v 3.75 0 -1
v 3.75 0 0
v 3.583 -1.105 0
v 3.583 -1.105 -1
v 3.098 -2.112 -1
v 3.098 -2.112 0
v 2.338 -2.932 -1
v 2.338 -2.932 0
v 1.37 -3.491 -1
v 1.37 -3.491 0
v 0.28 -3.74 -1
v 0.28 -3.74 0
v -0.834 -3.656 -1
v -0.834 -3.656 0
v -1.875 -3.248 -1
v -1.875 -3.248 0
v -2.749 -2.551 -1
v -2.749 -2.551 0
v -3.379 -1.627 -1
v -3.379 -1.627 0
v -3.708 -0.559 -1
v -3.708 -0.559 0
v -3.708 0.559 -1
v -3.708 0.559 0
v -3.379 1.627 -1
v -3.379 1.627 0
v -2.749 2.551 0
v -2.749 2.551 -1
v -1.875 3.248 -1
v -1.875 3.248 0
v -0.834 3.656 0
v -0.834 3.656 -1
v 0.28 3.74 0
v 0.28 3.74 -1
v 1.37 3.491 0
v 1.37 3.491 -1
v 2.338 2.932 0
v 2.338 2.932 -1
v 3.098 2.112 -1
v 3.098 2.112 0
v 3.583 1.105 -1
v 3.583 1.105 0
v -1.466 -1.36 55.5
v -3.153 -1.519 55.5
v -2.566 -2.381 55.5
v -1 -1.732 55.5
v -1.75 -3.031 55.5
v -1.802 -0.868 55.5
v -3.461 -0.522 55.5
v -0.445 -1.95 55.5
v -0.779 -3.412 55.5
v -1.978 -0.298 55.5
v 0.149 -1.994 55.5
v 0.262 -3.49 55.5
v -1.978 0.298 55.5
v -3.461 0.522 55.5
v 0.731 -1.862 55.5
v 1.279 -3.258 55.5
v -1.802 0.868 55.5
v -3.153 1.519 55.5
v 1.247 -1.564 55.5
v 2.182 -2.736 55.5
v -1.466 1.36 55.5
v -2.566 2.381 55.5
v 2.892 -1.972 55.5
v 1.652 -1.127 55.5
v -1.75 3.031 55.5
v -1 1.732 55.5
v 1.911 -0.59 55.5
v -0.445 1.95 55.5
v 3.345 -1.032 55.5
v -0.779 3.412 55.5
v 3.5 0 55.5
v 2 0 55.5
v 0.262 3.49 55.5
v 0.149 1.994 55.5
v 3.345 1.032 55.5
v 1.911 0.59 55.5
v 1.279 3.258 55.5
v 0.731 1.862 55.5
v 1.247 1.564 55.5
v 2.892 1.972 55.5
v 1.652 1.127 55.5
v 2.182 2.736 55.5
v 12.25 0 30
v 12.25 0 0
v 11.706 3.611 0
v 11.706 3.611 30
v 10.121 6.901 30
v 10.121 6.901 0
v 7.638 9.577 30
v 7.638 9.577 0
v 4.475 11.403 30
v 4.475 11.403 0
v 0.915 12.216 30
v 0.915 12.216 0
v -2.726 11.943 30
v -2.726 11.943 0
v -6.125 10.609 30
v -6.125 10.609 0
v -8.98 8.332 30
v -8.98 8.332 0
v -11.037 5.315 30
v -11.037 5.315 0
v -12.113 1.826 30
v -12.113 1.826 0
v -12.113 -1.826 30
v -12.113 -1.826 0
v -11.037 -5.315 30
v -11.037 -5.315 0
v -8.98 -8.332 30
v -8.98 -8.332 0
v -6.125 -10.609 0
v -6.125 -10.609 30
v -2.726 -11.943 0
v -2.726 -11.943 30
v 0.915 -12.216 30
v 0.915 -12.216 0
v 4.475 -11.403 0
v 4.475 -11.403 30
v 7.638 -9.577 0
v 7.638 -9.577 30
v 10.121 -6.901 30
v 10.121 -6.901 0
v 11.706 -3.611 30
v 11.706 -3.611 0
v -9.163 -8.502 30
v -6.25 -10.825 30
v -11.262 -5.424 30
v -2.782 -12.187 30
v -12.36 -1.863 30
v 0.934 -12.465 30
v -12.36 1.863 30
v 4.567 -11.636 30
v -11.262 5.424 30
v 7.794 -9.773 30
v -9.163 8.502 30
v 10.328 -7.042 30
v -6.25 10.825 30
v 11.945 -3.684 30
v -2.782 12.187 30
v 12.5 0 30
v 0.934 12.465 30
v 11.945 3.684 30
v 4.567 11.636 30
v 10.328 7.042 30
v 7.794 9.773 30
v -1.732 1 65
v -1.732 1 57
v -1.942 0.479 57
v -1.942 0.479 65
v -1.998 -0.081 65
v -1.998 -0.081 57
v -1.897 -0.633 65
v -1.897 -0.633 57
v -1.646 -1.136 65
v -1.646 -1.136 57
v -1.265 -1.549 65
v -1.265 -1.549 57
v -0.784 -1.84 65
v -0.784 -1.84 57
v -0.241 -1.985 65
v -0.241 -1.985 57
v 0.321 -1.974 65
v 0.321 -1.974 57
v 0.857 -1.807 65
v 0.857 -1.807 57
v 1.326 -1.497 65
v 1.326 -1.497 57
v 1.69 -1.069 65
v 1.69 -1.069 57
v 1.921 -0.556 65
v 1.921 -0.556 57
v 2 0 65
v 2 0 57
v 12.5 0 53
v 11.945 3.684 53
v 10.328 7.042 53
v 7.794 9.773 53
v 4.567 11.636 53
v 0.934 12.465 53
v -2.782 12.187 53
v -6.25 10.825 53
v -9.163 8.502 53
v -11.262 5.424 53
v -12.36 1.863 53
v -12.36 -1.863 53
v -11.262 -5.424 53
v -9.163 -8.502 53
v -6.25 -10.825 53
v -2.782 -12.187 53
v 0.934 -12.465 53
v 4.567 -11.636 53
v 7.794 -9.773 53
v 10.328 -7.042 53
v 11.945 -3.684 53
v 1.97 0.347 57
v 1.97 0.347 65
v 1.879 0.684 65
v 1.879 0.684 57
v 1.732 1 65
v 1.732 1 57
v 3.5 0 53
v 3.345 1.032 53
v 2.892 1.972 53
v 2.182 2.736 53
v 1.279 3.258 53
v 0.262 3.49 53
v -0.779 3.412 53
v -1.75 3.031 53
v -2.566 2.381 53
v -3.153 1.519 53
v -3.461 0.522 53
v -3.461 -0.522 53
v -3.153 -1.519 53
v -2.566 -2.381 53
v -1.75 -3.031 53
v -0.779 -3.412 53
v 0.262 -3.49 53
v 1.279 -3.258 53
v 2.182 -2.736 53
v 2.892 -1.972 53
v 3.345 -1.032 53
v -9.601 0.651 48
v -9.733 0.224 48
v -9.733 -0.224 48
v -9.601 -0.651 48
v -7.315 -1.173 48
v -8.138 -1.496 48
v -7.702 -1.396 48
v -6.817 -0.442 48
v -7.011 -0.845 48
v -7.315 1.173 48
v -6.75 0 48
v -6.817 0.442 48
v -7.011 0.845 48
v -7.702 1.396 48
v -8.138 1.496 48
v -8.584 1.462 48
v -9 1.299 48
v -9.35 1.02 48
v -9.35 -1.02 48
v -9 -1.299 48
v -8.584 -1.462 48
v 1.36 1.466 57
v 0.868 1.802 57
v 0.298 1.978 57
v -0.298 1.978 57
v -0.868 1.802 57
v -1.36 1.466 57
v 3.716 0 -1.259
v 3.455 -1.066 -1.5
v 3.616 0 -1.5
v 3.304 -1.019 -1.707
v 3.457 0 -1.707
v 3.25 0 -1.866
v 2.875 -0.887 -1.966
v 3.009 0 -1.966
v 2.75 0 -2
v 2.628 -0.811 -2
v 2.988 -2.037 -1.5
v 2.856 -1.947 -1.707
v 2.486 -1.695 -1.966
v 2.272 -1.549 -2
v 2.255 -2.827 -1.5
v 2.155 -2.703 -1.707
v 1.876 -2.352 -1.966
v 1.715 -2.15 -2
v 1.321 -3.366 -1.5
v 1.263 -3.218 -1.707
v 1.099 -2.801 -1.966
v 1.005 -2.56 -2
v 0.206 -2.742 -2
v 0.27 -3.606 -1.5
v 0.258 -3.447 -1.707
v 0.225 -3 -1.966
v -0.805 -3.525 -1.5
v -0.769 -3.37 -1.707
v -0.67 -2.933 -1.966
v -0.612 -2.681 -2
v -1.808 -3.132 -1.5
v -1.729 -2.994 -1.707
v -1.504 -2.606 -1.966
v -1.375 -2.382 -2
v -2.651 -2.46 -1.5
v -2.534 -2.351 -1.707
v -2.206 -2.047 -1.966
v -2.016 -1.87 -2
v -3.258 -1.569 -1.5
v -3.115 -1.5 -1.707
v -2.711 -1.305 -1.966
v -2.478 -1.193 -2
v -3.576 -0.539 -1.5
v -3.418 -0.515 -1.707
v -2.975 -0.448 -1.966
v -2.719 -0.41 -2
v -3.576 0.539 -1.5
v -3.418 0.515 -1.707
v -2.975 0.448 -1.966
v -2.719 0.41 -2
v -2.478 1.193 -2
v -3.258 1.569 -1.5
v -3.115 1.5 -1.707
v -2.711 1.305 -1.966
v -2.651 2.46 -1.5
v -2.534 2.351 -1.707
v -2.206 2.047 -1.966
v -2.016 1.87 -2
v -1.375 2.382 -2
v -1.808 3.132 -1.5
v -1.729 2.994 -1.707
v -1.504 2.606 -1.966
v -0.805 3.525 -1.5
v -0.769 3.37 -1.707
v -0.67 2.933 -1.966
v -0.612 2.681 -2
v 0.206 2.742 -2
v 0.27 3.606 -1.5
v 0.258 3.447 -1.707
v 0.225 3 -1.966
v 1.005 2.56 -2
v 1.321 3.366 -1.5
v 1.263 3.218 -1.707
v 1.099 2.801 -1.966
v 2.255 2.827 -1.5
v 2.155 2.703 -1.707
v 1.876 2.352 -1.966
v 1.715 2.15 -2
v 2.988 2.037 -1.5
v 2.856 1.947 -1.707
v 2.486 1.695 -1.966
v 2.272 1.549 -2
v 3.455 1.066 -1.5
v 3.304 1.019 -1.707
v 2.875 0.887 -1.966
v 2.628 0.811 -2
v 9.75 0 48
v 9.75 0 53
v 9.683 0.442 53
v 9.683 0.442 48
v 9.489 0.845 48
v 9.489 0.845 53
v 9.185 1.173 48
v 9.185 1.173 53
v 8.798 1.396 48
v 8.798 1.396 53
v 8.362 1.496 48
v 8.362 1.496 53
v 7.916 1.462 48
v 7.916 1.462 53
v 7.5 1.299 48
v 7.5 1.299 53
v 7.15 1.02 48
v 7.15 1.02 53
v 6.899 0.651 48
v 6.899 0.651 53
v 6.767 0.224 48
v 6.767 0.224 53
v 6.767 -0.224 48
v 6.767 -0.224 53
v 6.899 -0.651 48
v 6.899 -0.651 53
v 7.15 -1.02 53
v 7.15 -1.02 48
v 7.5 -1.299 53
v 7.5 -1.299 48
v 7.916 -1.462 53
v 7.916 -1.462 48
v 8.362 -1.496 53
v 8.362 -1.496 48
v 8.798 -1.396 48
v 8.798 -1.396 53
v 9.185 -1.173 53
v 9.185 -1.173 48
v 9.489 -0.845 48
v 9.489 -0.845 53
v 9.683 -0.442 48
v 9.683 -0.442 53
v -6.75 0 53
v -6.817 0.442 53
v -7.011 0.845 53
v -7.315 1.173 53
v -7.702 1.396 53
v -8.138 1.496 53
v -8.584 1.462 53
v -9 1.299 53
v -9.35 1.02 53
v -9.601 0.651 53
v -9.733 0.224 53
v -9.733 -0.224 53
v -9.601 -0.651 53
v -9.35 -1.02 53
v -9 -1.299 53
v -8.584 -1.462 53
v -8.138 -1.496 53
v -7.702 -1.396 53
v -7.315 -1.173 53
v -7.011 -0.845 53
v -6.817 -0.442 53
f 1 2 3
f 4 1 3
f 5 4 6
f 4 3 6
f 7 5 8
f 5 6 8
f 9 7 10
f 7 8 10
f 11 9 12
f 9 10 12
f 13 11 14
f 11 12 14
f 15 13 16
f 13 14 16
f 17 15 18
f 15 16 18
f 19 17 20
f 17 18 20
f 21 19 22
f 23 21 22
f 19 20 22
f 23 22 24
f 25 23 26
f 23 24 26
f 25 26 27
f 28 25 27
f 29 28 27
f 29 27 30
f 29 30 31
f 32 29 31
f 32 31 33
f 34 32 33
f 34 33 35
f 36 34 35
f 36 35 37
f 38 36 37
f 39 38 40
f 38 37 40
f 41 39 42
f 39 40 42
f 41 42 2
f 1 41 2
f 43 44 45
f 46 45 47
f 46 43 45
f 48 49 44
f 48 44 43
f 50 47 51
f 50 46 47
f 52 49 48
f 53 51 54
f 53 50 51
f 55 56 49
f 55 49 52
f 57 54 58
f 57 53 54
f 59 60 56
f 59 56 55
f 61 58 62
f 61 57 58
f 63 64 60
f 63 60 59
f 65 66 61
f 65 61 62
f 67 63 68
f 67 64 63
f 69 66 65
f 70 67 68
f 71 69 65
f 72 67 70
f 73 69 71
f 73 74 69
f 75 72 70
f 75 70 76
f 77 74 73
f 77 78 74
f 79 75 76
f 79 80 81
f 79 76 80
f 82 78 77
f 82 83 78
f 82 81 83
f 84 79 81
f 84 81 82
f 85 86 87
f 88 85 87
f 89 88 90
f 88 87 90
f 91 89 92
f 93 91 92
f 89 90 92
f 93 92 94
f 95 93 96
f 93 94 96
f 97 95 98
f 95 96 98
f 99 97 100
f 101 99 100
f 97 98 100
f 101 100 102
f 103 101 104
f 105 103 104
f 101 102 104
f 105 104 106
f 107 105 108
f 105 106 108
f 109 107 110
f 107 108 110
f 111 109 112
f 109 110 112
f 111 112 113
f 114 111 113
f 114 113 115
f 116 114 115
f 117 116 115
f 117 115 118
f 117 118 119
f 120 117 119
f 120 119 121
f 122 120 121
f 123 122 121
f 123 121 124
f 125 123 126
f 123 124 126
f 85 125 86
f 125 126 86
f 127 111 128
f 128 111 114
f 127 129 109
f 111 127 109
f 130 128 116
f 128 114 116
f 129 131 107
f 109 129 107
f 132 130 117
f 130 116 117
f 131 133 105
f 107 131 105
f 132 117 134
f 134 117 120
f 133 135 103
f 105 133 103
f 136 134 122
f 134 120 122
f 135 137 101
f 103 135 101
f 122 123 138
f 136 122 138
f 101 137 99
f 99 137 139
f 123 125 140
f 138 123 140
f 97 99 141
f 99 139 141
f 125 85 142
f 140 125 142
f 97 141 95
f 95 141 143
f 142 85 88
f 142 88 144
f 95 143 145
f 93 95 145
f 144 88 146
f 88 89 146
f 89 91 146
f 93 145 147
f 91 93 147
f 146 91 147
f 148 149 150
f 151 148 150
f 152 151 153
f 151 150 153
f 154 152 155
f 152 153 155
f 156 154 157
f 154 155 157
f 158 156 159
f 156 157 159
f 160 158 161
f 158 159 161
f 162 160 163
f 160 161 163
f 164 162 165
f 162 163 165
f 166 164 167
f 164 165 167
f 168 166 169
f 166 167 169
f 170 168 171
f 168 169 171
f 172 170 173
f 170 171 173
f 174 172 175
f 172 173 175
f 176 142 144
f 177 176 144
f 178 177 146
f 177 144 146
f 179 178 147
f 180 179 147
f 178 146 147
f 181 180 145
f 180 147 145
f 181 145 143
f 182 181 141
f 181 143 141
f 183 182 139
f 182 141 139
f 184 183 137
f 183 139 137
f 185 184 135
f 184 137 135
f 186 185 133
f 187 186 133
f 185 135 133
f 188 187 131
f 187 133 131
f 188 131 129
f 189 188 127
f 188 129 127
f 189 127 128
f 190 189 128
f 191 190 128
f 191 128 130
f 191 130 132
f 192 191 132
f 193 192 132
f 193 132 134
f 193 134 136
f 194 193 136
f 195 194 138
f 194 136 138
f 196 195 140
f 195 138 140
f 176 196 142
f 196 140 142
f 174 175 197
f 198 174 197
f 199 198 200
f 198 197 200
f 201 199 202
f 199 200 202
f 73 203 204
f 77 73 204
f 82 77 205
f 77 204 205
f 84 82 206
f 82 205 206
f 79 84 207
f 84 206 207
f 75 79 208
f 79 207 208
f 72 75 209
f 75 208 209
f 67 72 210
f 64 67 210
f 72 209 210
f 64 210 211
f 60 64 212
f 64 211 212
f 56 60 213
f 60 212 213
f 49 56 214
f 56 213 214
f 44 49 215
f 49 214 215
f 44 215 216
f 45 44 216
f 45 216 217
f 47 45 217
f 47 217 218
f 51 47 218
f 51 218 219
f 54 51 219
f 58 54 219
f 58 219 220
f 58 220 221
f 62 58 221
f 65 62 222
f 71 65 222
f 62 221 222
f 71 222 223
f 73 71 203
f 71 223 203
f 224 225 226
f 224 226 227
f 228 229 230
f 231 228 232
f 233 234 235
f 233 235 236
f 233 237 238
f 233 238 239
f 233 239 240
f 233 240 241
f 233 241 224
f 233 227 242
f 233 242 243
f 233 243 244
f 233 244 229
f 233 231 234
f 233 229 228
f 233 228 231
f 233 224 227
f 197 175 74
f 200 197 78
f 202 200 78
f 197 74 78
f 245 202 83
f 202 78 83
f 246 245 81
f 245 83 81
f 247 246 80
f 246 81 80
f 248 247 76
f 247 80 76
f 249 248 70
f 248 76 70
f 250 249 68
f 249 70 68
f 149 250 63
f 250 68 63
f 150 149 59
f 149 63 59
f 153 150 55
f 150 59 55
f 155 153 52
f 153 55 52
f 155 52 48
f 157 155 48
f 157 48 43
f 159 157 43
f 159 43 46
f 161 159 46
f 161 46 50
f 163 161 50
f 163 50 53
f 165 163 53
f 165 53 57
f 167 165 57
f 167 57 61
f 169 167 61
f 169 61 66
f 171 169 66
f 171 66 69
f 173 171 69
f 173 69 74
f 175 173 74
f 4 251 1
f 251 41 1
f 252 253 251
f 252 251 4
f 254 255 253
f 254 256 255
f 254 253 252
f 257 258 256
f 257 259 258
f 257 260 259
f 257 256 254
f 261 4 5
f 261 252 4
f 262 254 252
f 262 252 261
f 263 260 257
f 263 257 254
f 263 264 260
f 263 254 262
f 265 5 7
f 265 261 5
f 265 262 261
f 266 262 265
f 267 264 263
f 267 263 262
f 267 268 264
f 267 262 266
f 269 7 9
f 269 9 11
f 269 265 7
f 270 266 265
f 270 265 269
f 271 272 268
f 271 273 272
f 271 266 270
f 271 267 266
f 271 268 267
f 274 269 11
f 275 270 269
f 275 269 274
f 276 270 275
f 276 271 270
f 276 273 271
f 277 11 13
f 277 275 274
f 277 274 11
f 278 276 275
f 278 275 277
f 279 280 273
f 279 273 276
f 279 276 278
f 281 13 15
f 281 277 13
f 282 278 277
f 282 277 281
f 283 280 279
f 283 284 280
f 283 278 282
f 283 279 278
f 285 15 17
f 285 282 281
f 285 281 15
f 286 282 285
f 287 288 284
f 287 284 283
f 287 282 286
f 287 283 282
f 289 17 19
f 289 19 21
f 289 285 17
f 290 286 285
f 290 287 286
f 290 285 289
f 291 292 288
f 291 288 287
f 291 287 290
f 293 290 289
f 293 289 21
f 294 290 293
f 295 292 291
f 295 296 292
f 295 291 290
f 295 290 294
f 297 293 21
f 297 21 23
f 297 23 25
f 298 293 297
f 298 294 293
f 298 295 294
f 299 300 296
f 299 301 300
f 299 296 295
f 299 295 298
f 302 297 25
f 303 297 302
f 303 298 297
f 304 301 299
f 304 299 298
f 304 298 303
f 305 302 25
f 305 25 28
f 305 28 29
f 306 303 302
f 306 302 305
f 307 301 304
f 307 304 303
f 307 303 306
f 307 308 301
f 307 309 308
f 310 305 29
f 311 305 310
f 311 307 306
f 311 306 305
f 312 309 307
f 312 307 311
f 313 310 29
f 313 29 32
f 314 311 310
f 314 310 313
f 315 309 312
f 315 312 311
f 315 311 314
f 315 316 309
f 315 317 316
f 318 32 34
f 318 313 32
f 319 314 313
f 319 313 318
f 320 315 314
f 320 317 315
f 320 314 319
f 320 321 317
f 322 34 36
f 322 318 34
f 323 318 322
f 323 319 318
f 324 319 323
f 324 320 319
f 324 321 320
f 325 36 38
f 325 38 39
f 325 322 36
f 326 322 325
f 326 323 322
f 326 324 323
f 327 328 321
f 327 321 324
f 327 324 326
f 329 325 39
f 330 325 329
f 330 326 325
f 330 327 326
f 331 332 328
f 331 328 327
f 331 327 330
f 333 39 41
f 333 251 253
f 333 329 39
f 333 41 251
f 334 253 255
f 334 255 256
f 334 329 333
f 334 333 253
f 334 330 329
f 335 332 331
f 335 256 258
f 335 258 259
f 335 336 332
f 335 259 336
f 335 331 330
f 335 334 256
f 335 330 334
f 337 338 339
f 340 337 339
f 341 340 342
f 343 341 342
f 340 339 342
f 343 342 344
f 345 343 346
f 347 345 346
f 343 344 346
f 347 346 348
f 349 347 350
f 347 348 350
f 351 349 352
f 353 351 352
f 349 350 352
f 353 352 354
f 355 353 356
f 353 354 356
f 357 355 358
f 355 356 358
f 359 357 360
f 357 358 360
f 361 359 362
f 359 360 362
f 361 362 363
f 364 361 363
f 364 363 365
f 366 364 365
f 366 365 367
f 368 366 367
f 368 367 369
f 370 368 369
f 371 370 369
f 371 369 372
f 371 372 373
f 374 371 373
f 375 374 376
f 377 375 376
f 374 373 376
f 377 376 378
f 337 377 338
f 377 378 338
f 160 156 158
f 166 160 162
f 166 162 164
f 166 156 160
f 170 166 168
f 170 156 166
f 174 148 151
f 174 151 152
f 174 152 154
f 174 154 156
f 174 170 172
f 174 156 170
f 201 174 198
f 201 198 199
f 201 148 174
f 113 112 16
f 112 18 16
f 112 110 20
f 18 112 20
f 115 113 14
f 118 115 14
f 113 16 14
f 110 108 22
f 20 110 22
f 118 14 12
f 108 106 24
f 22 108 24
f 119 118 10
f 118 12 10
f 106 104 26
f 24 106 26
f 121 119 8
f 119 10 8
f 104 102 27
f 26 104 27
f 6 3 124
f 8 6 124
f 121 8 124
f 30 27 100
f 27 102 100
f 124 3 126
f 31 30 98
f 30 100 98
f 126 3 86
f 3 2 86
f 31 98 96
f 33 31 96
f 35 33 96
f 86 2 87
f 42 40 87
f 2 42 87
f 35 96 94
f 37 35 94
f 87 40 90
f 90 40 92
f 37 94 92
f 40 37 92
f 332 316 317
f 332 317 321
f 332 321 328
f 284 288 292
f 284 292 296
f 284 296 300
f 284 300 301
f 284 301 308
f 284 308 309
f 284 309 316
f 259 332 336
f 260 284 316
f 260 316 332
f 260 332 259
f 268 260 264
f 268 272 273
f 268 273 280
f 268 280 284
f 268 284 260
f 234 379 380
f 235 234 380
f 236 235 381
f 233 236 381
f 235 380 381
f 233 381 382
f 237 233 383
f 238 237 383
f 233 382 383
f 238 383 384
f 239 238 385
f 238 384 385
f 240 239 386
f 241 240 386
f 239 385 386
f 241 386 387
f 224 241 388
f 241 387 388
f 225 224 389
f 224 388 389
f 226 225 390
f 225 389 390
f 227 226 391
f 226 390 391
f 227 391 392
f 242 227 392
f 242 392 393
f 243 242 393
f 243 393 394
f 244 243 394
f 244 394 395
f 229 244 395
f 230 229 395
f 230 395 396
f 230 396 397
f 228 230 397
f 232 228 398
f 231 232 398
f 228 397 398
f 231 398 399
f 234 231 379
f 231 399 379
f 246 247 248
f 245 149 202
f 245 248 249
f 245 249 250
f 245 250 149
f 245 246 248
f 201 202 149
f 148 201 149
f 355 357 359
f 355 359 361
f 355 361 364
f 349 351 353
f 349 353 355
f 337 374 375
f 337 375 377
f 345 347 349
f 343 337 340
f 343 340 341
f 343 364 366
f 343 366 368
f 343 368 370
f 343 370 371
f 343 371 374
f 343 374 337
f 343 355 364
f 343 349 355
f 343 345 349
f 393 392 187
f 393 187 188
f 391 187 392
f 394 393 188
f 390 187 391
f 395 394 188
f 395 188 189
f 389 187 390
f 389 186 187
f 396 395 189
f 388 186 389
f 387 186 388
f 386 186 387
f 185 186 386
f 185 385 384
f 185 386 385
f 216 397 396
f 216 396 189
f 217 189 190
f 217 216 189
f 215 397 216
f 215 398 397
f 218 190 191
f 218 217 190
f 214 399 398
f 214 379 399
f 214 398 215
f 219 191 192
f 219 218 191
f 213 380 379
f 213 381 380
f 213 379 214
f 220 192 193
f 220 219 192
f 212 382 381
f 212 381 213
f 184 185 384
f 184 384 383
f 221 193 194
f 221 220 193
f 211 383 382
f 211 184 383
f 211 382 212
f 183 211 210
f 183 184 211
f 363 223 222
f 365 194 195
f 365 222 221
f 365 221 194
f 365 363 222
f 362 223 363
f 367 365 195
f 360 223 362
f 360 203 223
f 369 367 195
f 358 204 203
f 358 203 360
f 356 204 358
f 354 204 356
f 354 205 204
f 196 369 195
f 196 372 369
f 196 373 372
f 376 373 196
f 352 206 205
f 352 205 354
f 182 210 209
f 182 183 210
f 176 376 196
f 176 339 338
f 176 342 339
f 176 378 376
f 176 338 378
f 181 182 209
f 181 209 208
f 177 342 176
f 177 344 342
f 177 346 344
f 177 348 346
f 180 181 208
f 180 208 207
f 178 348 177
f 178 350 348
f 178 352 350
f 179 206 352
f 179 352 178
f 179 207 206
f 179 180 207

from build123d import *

# Parameters (mm, degrees)
SKETCH1_R           = 12.25
BOSS_EXTRUDE1_DEPTH = 30
SKETCH2_R           = 12.5
BOSS_EXTRUDE2_DEPTH = 23
CUT_EXTRUDE1_DEPTH  = 5
SKETCH3_R           = 3.5
BOSS_EXTRUDE3_DEPTH = 2.5
SKETCH4_R           = 2
BOSS_EXTRUDE4_DEPTH = 1.5
BOSS_EXTRUDE5_DEPTH = 8
SKETCH6_R           = 3.75
BOSS_EXTRUDE6_DEPTH = 2
FILLET1_R           = 1


with BuildPart() as part:
    # Sketch1 → Boss-Extrude1 (new body)
    with BuildSketch(Plane.XY):
        Circle(SKETCH1_R)
    extrude(amount=BOSS_EXTRUDE1_DEPTH)

    # Sketch2 → Boss-Extrude2 (add)
    with BuildSketch(Plane.XY.offset(30)):
        Circle(SKETCH2_R)
    extrude(amount=BOSS_EXTRUDE2_DEPTH)

    # Sketch7 → Cut-Extrude1 (cut)
    with BuildSketch(Plane.XY.offset(53)):
        with BuildLine():
            ThreePointArc((-9.75, 0), (-8.25, -1.5), (-6.75, 0))
            Line((-6.75, 0), (-8.25, 0))
            Line((-8.25, 0), (-9.75, 0))
        make_face()
        with BuildLine():
            Line((-8.25, 0), (-6.75, 0))
            ThreePointArc((-6.75, 0), (-8.25, 1.5), (-9.75, 0))
            Line((-9.75, 0), (-8.25, 0))
        make_face()
        with BuildLine():
            ThreePointArc((6.75, 0), (8.25, -1.5), (9.75, 0))
            Line((9.75, 0), (8.25, 0))
            Line((8.25, 0), (6.75, 0))
        make_face()
        with BuildLine():
            Line((8.25, 0), (9.75, 0))
            ThreePointArc((9.75, 0), (8.25, 1.5), (6.75, 0))
            Line((6.75, 0), (8.25, 0))
        make_face()
    extrude(amount=-CUT_EXTRUDE1_DEPTH, mode=Mode.SUBTRACT)

    # Sketch3 → Boss-Extrude3 (add)
    with BuildSketch(Plane.XY.offset(53)):
        Circle(SKETCH3_R)
    extrude(amount=BOSS_EXTRUDE3_DEPTH)

    # Sketch4 → Boss-Extrude4 (add)
    with BuildSketch(Plane.XY.offset(55.5)):
        Circle(SKETCH4_R)
    extrude(amount=BOSS_EXTRUDE4_DEPTH)

    # Sketch5 → Boss-Extrude5 (add)
    with BuildSketch(Plane.XY.offset(57)):
        with BuildLine():
            Line((1.732050808, 1), (-1.732050808, 1))
            ThreePointArc((-1.732050808, 1), (-0.51763809, -1.931851653), (2, 0))
            ThreePointArc((2, 0), (1.931851653, 0.51763809), (1.732050808, 1))
        make_face()
    extrude(amount=BOSS_EXTRUDE5_DEPTH)

    # Sketch6 → Boss-Extrude6 (add)
    with BuildSketch(Plane(origin=(0, 0, 0), x_dir=(-1, 0, 0), z_dir=(0, 0, -1))):
        with Locations(Location((0, 0, 0), (0, 0, 180))):
            Circle(SKETCH6_R)
    extrude(amount=BOSS_EXTRUDE6_DEPTH)

    # Fillet1
    fillet1_edges = [part.edges().sort_by_distance(p)[0] for p in [
        (-3.75, 0, -2),
    ]]
    fillet(fillet1_edges, radius=FILLET1_R)


solid = part.part
